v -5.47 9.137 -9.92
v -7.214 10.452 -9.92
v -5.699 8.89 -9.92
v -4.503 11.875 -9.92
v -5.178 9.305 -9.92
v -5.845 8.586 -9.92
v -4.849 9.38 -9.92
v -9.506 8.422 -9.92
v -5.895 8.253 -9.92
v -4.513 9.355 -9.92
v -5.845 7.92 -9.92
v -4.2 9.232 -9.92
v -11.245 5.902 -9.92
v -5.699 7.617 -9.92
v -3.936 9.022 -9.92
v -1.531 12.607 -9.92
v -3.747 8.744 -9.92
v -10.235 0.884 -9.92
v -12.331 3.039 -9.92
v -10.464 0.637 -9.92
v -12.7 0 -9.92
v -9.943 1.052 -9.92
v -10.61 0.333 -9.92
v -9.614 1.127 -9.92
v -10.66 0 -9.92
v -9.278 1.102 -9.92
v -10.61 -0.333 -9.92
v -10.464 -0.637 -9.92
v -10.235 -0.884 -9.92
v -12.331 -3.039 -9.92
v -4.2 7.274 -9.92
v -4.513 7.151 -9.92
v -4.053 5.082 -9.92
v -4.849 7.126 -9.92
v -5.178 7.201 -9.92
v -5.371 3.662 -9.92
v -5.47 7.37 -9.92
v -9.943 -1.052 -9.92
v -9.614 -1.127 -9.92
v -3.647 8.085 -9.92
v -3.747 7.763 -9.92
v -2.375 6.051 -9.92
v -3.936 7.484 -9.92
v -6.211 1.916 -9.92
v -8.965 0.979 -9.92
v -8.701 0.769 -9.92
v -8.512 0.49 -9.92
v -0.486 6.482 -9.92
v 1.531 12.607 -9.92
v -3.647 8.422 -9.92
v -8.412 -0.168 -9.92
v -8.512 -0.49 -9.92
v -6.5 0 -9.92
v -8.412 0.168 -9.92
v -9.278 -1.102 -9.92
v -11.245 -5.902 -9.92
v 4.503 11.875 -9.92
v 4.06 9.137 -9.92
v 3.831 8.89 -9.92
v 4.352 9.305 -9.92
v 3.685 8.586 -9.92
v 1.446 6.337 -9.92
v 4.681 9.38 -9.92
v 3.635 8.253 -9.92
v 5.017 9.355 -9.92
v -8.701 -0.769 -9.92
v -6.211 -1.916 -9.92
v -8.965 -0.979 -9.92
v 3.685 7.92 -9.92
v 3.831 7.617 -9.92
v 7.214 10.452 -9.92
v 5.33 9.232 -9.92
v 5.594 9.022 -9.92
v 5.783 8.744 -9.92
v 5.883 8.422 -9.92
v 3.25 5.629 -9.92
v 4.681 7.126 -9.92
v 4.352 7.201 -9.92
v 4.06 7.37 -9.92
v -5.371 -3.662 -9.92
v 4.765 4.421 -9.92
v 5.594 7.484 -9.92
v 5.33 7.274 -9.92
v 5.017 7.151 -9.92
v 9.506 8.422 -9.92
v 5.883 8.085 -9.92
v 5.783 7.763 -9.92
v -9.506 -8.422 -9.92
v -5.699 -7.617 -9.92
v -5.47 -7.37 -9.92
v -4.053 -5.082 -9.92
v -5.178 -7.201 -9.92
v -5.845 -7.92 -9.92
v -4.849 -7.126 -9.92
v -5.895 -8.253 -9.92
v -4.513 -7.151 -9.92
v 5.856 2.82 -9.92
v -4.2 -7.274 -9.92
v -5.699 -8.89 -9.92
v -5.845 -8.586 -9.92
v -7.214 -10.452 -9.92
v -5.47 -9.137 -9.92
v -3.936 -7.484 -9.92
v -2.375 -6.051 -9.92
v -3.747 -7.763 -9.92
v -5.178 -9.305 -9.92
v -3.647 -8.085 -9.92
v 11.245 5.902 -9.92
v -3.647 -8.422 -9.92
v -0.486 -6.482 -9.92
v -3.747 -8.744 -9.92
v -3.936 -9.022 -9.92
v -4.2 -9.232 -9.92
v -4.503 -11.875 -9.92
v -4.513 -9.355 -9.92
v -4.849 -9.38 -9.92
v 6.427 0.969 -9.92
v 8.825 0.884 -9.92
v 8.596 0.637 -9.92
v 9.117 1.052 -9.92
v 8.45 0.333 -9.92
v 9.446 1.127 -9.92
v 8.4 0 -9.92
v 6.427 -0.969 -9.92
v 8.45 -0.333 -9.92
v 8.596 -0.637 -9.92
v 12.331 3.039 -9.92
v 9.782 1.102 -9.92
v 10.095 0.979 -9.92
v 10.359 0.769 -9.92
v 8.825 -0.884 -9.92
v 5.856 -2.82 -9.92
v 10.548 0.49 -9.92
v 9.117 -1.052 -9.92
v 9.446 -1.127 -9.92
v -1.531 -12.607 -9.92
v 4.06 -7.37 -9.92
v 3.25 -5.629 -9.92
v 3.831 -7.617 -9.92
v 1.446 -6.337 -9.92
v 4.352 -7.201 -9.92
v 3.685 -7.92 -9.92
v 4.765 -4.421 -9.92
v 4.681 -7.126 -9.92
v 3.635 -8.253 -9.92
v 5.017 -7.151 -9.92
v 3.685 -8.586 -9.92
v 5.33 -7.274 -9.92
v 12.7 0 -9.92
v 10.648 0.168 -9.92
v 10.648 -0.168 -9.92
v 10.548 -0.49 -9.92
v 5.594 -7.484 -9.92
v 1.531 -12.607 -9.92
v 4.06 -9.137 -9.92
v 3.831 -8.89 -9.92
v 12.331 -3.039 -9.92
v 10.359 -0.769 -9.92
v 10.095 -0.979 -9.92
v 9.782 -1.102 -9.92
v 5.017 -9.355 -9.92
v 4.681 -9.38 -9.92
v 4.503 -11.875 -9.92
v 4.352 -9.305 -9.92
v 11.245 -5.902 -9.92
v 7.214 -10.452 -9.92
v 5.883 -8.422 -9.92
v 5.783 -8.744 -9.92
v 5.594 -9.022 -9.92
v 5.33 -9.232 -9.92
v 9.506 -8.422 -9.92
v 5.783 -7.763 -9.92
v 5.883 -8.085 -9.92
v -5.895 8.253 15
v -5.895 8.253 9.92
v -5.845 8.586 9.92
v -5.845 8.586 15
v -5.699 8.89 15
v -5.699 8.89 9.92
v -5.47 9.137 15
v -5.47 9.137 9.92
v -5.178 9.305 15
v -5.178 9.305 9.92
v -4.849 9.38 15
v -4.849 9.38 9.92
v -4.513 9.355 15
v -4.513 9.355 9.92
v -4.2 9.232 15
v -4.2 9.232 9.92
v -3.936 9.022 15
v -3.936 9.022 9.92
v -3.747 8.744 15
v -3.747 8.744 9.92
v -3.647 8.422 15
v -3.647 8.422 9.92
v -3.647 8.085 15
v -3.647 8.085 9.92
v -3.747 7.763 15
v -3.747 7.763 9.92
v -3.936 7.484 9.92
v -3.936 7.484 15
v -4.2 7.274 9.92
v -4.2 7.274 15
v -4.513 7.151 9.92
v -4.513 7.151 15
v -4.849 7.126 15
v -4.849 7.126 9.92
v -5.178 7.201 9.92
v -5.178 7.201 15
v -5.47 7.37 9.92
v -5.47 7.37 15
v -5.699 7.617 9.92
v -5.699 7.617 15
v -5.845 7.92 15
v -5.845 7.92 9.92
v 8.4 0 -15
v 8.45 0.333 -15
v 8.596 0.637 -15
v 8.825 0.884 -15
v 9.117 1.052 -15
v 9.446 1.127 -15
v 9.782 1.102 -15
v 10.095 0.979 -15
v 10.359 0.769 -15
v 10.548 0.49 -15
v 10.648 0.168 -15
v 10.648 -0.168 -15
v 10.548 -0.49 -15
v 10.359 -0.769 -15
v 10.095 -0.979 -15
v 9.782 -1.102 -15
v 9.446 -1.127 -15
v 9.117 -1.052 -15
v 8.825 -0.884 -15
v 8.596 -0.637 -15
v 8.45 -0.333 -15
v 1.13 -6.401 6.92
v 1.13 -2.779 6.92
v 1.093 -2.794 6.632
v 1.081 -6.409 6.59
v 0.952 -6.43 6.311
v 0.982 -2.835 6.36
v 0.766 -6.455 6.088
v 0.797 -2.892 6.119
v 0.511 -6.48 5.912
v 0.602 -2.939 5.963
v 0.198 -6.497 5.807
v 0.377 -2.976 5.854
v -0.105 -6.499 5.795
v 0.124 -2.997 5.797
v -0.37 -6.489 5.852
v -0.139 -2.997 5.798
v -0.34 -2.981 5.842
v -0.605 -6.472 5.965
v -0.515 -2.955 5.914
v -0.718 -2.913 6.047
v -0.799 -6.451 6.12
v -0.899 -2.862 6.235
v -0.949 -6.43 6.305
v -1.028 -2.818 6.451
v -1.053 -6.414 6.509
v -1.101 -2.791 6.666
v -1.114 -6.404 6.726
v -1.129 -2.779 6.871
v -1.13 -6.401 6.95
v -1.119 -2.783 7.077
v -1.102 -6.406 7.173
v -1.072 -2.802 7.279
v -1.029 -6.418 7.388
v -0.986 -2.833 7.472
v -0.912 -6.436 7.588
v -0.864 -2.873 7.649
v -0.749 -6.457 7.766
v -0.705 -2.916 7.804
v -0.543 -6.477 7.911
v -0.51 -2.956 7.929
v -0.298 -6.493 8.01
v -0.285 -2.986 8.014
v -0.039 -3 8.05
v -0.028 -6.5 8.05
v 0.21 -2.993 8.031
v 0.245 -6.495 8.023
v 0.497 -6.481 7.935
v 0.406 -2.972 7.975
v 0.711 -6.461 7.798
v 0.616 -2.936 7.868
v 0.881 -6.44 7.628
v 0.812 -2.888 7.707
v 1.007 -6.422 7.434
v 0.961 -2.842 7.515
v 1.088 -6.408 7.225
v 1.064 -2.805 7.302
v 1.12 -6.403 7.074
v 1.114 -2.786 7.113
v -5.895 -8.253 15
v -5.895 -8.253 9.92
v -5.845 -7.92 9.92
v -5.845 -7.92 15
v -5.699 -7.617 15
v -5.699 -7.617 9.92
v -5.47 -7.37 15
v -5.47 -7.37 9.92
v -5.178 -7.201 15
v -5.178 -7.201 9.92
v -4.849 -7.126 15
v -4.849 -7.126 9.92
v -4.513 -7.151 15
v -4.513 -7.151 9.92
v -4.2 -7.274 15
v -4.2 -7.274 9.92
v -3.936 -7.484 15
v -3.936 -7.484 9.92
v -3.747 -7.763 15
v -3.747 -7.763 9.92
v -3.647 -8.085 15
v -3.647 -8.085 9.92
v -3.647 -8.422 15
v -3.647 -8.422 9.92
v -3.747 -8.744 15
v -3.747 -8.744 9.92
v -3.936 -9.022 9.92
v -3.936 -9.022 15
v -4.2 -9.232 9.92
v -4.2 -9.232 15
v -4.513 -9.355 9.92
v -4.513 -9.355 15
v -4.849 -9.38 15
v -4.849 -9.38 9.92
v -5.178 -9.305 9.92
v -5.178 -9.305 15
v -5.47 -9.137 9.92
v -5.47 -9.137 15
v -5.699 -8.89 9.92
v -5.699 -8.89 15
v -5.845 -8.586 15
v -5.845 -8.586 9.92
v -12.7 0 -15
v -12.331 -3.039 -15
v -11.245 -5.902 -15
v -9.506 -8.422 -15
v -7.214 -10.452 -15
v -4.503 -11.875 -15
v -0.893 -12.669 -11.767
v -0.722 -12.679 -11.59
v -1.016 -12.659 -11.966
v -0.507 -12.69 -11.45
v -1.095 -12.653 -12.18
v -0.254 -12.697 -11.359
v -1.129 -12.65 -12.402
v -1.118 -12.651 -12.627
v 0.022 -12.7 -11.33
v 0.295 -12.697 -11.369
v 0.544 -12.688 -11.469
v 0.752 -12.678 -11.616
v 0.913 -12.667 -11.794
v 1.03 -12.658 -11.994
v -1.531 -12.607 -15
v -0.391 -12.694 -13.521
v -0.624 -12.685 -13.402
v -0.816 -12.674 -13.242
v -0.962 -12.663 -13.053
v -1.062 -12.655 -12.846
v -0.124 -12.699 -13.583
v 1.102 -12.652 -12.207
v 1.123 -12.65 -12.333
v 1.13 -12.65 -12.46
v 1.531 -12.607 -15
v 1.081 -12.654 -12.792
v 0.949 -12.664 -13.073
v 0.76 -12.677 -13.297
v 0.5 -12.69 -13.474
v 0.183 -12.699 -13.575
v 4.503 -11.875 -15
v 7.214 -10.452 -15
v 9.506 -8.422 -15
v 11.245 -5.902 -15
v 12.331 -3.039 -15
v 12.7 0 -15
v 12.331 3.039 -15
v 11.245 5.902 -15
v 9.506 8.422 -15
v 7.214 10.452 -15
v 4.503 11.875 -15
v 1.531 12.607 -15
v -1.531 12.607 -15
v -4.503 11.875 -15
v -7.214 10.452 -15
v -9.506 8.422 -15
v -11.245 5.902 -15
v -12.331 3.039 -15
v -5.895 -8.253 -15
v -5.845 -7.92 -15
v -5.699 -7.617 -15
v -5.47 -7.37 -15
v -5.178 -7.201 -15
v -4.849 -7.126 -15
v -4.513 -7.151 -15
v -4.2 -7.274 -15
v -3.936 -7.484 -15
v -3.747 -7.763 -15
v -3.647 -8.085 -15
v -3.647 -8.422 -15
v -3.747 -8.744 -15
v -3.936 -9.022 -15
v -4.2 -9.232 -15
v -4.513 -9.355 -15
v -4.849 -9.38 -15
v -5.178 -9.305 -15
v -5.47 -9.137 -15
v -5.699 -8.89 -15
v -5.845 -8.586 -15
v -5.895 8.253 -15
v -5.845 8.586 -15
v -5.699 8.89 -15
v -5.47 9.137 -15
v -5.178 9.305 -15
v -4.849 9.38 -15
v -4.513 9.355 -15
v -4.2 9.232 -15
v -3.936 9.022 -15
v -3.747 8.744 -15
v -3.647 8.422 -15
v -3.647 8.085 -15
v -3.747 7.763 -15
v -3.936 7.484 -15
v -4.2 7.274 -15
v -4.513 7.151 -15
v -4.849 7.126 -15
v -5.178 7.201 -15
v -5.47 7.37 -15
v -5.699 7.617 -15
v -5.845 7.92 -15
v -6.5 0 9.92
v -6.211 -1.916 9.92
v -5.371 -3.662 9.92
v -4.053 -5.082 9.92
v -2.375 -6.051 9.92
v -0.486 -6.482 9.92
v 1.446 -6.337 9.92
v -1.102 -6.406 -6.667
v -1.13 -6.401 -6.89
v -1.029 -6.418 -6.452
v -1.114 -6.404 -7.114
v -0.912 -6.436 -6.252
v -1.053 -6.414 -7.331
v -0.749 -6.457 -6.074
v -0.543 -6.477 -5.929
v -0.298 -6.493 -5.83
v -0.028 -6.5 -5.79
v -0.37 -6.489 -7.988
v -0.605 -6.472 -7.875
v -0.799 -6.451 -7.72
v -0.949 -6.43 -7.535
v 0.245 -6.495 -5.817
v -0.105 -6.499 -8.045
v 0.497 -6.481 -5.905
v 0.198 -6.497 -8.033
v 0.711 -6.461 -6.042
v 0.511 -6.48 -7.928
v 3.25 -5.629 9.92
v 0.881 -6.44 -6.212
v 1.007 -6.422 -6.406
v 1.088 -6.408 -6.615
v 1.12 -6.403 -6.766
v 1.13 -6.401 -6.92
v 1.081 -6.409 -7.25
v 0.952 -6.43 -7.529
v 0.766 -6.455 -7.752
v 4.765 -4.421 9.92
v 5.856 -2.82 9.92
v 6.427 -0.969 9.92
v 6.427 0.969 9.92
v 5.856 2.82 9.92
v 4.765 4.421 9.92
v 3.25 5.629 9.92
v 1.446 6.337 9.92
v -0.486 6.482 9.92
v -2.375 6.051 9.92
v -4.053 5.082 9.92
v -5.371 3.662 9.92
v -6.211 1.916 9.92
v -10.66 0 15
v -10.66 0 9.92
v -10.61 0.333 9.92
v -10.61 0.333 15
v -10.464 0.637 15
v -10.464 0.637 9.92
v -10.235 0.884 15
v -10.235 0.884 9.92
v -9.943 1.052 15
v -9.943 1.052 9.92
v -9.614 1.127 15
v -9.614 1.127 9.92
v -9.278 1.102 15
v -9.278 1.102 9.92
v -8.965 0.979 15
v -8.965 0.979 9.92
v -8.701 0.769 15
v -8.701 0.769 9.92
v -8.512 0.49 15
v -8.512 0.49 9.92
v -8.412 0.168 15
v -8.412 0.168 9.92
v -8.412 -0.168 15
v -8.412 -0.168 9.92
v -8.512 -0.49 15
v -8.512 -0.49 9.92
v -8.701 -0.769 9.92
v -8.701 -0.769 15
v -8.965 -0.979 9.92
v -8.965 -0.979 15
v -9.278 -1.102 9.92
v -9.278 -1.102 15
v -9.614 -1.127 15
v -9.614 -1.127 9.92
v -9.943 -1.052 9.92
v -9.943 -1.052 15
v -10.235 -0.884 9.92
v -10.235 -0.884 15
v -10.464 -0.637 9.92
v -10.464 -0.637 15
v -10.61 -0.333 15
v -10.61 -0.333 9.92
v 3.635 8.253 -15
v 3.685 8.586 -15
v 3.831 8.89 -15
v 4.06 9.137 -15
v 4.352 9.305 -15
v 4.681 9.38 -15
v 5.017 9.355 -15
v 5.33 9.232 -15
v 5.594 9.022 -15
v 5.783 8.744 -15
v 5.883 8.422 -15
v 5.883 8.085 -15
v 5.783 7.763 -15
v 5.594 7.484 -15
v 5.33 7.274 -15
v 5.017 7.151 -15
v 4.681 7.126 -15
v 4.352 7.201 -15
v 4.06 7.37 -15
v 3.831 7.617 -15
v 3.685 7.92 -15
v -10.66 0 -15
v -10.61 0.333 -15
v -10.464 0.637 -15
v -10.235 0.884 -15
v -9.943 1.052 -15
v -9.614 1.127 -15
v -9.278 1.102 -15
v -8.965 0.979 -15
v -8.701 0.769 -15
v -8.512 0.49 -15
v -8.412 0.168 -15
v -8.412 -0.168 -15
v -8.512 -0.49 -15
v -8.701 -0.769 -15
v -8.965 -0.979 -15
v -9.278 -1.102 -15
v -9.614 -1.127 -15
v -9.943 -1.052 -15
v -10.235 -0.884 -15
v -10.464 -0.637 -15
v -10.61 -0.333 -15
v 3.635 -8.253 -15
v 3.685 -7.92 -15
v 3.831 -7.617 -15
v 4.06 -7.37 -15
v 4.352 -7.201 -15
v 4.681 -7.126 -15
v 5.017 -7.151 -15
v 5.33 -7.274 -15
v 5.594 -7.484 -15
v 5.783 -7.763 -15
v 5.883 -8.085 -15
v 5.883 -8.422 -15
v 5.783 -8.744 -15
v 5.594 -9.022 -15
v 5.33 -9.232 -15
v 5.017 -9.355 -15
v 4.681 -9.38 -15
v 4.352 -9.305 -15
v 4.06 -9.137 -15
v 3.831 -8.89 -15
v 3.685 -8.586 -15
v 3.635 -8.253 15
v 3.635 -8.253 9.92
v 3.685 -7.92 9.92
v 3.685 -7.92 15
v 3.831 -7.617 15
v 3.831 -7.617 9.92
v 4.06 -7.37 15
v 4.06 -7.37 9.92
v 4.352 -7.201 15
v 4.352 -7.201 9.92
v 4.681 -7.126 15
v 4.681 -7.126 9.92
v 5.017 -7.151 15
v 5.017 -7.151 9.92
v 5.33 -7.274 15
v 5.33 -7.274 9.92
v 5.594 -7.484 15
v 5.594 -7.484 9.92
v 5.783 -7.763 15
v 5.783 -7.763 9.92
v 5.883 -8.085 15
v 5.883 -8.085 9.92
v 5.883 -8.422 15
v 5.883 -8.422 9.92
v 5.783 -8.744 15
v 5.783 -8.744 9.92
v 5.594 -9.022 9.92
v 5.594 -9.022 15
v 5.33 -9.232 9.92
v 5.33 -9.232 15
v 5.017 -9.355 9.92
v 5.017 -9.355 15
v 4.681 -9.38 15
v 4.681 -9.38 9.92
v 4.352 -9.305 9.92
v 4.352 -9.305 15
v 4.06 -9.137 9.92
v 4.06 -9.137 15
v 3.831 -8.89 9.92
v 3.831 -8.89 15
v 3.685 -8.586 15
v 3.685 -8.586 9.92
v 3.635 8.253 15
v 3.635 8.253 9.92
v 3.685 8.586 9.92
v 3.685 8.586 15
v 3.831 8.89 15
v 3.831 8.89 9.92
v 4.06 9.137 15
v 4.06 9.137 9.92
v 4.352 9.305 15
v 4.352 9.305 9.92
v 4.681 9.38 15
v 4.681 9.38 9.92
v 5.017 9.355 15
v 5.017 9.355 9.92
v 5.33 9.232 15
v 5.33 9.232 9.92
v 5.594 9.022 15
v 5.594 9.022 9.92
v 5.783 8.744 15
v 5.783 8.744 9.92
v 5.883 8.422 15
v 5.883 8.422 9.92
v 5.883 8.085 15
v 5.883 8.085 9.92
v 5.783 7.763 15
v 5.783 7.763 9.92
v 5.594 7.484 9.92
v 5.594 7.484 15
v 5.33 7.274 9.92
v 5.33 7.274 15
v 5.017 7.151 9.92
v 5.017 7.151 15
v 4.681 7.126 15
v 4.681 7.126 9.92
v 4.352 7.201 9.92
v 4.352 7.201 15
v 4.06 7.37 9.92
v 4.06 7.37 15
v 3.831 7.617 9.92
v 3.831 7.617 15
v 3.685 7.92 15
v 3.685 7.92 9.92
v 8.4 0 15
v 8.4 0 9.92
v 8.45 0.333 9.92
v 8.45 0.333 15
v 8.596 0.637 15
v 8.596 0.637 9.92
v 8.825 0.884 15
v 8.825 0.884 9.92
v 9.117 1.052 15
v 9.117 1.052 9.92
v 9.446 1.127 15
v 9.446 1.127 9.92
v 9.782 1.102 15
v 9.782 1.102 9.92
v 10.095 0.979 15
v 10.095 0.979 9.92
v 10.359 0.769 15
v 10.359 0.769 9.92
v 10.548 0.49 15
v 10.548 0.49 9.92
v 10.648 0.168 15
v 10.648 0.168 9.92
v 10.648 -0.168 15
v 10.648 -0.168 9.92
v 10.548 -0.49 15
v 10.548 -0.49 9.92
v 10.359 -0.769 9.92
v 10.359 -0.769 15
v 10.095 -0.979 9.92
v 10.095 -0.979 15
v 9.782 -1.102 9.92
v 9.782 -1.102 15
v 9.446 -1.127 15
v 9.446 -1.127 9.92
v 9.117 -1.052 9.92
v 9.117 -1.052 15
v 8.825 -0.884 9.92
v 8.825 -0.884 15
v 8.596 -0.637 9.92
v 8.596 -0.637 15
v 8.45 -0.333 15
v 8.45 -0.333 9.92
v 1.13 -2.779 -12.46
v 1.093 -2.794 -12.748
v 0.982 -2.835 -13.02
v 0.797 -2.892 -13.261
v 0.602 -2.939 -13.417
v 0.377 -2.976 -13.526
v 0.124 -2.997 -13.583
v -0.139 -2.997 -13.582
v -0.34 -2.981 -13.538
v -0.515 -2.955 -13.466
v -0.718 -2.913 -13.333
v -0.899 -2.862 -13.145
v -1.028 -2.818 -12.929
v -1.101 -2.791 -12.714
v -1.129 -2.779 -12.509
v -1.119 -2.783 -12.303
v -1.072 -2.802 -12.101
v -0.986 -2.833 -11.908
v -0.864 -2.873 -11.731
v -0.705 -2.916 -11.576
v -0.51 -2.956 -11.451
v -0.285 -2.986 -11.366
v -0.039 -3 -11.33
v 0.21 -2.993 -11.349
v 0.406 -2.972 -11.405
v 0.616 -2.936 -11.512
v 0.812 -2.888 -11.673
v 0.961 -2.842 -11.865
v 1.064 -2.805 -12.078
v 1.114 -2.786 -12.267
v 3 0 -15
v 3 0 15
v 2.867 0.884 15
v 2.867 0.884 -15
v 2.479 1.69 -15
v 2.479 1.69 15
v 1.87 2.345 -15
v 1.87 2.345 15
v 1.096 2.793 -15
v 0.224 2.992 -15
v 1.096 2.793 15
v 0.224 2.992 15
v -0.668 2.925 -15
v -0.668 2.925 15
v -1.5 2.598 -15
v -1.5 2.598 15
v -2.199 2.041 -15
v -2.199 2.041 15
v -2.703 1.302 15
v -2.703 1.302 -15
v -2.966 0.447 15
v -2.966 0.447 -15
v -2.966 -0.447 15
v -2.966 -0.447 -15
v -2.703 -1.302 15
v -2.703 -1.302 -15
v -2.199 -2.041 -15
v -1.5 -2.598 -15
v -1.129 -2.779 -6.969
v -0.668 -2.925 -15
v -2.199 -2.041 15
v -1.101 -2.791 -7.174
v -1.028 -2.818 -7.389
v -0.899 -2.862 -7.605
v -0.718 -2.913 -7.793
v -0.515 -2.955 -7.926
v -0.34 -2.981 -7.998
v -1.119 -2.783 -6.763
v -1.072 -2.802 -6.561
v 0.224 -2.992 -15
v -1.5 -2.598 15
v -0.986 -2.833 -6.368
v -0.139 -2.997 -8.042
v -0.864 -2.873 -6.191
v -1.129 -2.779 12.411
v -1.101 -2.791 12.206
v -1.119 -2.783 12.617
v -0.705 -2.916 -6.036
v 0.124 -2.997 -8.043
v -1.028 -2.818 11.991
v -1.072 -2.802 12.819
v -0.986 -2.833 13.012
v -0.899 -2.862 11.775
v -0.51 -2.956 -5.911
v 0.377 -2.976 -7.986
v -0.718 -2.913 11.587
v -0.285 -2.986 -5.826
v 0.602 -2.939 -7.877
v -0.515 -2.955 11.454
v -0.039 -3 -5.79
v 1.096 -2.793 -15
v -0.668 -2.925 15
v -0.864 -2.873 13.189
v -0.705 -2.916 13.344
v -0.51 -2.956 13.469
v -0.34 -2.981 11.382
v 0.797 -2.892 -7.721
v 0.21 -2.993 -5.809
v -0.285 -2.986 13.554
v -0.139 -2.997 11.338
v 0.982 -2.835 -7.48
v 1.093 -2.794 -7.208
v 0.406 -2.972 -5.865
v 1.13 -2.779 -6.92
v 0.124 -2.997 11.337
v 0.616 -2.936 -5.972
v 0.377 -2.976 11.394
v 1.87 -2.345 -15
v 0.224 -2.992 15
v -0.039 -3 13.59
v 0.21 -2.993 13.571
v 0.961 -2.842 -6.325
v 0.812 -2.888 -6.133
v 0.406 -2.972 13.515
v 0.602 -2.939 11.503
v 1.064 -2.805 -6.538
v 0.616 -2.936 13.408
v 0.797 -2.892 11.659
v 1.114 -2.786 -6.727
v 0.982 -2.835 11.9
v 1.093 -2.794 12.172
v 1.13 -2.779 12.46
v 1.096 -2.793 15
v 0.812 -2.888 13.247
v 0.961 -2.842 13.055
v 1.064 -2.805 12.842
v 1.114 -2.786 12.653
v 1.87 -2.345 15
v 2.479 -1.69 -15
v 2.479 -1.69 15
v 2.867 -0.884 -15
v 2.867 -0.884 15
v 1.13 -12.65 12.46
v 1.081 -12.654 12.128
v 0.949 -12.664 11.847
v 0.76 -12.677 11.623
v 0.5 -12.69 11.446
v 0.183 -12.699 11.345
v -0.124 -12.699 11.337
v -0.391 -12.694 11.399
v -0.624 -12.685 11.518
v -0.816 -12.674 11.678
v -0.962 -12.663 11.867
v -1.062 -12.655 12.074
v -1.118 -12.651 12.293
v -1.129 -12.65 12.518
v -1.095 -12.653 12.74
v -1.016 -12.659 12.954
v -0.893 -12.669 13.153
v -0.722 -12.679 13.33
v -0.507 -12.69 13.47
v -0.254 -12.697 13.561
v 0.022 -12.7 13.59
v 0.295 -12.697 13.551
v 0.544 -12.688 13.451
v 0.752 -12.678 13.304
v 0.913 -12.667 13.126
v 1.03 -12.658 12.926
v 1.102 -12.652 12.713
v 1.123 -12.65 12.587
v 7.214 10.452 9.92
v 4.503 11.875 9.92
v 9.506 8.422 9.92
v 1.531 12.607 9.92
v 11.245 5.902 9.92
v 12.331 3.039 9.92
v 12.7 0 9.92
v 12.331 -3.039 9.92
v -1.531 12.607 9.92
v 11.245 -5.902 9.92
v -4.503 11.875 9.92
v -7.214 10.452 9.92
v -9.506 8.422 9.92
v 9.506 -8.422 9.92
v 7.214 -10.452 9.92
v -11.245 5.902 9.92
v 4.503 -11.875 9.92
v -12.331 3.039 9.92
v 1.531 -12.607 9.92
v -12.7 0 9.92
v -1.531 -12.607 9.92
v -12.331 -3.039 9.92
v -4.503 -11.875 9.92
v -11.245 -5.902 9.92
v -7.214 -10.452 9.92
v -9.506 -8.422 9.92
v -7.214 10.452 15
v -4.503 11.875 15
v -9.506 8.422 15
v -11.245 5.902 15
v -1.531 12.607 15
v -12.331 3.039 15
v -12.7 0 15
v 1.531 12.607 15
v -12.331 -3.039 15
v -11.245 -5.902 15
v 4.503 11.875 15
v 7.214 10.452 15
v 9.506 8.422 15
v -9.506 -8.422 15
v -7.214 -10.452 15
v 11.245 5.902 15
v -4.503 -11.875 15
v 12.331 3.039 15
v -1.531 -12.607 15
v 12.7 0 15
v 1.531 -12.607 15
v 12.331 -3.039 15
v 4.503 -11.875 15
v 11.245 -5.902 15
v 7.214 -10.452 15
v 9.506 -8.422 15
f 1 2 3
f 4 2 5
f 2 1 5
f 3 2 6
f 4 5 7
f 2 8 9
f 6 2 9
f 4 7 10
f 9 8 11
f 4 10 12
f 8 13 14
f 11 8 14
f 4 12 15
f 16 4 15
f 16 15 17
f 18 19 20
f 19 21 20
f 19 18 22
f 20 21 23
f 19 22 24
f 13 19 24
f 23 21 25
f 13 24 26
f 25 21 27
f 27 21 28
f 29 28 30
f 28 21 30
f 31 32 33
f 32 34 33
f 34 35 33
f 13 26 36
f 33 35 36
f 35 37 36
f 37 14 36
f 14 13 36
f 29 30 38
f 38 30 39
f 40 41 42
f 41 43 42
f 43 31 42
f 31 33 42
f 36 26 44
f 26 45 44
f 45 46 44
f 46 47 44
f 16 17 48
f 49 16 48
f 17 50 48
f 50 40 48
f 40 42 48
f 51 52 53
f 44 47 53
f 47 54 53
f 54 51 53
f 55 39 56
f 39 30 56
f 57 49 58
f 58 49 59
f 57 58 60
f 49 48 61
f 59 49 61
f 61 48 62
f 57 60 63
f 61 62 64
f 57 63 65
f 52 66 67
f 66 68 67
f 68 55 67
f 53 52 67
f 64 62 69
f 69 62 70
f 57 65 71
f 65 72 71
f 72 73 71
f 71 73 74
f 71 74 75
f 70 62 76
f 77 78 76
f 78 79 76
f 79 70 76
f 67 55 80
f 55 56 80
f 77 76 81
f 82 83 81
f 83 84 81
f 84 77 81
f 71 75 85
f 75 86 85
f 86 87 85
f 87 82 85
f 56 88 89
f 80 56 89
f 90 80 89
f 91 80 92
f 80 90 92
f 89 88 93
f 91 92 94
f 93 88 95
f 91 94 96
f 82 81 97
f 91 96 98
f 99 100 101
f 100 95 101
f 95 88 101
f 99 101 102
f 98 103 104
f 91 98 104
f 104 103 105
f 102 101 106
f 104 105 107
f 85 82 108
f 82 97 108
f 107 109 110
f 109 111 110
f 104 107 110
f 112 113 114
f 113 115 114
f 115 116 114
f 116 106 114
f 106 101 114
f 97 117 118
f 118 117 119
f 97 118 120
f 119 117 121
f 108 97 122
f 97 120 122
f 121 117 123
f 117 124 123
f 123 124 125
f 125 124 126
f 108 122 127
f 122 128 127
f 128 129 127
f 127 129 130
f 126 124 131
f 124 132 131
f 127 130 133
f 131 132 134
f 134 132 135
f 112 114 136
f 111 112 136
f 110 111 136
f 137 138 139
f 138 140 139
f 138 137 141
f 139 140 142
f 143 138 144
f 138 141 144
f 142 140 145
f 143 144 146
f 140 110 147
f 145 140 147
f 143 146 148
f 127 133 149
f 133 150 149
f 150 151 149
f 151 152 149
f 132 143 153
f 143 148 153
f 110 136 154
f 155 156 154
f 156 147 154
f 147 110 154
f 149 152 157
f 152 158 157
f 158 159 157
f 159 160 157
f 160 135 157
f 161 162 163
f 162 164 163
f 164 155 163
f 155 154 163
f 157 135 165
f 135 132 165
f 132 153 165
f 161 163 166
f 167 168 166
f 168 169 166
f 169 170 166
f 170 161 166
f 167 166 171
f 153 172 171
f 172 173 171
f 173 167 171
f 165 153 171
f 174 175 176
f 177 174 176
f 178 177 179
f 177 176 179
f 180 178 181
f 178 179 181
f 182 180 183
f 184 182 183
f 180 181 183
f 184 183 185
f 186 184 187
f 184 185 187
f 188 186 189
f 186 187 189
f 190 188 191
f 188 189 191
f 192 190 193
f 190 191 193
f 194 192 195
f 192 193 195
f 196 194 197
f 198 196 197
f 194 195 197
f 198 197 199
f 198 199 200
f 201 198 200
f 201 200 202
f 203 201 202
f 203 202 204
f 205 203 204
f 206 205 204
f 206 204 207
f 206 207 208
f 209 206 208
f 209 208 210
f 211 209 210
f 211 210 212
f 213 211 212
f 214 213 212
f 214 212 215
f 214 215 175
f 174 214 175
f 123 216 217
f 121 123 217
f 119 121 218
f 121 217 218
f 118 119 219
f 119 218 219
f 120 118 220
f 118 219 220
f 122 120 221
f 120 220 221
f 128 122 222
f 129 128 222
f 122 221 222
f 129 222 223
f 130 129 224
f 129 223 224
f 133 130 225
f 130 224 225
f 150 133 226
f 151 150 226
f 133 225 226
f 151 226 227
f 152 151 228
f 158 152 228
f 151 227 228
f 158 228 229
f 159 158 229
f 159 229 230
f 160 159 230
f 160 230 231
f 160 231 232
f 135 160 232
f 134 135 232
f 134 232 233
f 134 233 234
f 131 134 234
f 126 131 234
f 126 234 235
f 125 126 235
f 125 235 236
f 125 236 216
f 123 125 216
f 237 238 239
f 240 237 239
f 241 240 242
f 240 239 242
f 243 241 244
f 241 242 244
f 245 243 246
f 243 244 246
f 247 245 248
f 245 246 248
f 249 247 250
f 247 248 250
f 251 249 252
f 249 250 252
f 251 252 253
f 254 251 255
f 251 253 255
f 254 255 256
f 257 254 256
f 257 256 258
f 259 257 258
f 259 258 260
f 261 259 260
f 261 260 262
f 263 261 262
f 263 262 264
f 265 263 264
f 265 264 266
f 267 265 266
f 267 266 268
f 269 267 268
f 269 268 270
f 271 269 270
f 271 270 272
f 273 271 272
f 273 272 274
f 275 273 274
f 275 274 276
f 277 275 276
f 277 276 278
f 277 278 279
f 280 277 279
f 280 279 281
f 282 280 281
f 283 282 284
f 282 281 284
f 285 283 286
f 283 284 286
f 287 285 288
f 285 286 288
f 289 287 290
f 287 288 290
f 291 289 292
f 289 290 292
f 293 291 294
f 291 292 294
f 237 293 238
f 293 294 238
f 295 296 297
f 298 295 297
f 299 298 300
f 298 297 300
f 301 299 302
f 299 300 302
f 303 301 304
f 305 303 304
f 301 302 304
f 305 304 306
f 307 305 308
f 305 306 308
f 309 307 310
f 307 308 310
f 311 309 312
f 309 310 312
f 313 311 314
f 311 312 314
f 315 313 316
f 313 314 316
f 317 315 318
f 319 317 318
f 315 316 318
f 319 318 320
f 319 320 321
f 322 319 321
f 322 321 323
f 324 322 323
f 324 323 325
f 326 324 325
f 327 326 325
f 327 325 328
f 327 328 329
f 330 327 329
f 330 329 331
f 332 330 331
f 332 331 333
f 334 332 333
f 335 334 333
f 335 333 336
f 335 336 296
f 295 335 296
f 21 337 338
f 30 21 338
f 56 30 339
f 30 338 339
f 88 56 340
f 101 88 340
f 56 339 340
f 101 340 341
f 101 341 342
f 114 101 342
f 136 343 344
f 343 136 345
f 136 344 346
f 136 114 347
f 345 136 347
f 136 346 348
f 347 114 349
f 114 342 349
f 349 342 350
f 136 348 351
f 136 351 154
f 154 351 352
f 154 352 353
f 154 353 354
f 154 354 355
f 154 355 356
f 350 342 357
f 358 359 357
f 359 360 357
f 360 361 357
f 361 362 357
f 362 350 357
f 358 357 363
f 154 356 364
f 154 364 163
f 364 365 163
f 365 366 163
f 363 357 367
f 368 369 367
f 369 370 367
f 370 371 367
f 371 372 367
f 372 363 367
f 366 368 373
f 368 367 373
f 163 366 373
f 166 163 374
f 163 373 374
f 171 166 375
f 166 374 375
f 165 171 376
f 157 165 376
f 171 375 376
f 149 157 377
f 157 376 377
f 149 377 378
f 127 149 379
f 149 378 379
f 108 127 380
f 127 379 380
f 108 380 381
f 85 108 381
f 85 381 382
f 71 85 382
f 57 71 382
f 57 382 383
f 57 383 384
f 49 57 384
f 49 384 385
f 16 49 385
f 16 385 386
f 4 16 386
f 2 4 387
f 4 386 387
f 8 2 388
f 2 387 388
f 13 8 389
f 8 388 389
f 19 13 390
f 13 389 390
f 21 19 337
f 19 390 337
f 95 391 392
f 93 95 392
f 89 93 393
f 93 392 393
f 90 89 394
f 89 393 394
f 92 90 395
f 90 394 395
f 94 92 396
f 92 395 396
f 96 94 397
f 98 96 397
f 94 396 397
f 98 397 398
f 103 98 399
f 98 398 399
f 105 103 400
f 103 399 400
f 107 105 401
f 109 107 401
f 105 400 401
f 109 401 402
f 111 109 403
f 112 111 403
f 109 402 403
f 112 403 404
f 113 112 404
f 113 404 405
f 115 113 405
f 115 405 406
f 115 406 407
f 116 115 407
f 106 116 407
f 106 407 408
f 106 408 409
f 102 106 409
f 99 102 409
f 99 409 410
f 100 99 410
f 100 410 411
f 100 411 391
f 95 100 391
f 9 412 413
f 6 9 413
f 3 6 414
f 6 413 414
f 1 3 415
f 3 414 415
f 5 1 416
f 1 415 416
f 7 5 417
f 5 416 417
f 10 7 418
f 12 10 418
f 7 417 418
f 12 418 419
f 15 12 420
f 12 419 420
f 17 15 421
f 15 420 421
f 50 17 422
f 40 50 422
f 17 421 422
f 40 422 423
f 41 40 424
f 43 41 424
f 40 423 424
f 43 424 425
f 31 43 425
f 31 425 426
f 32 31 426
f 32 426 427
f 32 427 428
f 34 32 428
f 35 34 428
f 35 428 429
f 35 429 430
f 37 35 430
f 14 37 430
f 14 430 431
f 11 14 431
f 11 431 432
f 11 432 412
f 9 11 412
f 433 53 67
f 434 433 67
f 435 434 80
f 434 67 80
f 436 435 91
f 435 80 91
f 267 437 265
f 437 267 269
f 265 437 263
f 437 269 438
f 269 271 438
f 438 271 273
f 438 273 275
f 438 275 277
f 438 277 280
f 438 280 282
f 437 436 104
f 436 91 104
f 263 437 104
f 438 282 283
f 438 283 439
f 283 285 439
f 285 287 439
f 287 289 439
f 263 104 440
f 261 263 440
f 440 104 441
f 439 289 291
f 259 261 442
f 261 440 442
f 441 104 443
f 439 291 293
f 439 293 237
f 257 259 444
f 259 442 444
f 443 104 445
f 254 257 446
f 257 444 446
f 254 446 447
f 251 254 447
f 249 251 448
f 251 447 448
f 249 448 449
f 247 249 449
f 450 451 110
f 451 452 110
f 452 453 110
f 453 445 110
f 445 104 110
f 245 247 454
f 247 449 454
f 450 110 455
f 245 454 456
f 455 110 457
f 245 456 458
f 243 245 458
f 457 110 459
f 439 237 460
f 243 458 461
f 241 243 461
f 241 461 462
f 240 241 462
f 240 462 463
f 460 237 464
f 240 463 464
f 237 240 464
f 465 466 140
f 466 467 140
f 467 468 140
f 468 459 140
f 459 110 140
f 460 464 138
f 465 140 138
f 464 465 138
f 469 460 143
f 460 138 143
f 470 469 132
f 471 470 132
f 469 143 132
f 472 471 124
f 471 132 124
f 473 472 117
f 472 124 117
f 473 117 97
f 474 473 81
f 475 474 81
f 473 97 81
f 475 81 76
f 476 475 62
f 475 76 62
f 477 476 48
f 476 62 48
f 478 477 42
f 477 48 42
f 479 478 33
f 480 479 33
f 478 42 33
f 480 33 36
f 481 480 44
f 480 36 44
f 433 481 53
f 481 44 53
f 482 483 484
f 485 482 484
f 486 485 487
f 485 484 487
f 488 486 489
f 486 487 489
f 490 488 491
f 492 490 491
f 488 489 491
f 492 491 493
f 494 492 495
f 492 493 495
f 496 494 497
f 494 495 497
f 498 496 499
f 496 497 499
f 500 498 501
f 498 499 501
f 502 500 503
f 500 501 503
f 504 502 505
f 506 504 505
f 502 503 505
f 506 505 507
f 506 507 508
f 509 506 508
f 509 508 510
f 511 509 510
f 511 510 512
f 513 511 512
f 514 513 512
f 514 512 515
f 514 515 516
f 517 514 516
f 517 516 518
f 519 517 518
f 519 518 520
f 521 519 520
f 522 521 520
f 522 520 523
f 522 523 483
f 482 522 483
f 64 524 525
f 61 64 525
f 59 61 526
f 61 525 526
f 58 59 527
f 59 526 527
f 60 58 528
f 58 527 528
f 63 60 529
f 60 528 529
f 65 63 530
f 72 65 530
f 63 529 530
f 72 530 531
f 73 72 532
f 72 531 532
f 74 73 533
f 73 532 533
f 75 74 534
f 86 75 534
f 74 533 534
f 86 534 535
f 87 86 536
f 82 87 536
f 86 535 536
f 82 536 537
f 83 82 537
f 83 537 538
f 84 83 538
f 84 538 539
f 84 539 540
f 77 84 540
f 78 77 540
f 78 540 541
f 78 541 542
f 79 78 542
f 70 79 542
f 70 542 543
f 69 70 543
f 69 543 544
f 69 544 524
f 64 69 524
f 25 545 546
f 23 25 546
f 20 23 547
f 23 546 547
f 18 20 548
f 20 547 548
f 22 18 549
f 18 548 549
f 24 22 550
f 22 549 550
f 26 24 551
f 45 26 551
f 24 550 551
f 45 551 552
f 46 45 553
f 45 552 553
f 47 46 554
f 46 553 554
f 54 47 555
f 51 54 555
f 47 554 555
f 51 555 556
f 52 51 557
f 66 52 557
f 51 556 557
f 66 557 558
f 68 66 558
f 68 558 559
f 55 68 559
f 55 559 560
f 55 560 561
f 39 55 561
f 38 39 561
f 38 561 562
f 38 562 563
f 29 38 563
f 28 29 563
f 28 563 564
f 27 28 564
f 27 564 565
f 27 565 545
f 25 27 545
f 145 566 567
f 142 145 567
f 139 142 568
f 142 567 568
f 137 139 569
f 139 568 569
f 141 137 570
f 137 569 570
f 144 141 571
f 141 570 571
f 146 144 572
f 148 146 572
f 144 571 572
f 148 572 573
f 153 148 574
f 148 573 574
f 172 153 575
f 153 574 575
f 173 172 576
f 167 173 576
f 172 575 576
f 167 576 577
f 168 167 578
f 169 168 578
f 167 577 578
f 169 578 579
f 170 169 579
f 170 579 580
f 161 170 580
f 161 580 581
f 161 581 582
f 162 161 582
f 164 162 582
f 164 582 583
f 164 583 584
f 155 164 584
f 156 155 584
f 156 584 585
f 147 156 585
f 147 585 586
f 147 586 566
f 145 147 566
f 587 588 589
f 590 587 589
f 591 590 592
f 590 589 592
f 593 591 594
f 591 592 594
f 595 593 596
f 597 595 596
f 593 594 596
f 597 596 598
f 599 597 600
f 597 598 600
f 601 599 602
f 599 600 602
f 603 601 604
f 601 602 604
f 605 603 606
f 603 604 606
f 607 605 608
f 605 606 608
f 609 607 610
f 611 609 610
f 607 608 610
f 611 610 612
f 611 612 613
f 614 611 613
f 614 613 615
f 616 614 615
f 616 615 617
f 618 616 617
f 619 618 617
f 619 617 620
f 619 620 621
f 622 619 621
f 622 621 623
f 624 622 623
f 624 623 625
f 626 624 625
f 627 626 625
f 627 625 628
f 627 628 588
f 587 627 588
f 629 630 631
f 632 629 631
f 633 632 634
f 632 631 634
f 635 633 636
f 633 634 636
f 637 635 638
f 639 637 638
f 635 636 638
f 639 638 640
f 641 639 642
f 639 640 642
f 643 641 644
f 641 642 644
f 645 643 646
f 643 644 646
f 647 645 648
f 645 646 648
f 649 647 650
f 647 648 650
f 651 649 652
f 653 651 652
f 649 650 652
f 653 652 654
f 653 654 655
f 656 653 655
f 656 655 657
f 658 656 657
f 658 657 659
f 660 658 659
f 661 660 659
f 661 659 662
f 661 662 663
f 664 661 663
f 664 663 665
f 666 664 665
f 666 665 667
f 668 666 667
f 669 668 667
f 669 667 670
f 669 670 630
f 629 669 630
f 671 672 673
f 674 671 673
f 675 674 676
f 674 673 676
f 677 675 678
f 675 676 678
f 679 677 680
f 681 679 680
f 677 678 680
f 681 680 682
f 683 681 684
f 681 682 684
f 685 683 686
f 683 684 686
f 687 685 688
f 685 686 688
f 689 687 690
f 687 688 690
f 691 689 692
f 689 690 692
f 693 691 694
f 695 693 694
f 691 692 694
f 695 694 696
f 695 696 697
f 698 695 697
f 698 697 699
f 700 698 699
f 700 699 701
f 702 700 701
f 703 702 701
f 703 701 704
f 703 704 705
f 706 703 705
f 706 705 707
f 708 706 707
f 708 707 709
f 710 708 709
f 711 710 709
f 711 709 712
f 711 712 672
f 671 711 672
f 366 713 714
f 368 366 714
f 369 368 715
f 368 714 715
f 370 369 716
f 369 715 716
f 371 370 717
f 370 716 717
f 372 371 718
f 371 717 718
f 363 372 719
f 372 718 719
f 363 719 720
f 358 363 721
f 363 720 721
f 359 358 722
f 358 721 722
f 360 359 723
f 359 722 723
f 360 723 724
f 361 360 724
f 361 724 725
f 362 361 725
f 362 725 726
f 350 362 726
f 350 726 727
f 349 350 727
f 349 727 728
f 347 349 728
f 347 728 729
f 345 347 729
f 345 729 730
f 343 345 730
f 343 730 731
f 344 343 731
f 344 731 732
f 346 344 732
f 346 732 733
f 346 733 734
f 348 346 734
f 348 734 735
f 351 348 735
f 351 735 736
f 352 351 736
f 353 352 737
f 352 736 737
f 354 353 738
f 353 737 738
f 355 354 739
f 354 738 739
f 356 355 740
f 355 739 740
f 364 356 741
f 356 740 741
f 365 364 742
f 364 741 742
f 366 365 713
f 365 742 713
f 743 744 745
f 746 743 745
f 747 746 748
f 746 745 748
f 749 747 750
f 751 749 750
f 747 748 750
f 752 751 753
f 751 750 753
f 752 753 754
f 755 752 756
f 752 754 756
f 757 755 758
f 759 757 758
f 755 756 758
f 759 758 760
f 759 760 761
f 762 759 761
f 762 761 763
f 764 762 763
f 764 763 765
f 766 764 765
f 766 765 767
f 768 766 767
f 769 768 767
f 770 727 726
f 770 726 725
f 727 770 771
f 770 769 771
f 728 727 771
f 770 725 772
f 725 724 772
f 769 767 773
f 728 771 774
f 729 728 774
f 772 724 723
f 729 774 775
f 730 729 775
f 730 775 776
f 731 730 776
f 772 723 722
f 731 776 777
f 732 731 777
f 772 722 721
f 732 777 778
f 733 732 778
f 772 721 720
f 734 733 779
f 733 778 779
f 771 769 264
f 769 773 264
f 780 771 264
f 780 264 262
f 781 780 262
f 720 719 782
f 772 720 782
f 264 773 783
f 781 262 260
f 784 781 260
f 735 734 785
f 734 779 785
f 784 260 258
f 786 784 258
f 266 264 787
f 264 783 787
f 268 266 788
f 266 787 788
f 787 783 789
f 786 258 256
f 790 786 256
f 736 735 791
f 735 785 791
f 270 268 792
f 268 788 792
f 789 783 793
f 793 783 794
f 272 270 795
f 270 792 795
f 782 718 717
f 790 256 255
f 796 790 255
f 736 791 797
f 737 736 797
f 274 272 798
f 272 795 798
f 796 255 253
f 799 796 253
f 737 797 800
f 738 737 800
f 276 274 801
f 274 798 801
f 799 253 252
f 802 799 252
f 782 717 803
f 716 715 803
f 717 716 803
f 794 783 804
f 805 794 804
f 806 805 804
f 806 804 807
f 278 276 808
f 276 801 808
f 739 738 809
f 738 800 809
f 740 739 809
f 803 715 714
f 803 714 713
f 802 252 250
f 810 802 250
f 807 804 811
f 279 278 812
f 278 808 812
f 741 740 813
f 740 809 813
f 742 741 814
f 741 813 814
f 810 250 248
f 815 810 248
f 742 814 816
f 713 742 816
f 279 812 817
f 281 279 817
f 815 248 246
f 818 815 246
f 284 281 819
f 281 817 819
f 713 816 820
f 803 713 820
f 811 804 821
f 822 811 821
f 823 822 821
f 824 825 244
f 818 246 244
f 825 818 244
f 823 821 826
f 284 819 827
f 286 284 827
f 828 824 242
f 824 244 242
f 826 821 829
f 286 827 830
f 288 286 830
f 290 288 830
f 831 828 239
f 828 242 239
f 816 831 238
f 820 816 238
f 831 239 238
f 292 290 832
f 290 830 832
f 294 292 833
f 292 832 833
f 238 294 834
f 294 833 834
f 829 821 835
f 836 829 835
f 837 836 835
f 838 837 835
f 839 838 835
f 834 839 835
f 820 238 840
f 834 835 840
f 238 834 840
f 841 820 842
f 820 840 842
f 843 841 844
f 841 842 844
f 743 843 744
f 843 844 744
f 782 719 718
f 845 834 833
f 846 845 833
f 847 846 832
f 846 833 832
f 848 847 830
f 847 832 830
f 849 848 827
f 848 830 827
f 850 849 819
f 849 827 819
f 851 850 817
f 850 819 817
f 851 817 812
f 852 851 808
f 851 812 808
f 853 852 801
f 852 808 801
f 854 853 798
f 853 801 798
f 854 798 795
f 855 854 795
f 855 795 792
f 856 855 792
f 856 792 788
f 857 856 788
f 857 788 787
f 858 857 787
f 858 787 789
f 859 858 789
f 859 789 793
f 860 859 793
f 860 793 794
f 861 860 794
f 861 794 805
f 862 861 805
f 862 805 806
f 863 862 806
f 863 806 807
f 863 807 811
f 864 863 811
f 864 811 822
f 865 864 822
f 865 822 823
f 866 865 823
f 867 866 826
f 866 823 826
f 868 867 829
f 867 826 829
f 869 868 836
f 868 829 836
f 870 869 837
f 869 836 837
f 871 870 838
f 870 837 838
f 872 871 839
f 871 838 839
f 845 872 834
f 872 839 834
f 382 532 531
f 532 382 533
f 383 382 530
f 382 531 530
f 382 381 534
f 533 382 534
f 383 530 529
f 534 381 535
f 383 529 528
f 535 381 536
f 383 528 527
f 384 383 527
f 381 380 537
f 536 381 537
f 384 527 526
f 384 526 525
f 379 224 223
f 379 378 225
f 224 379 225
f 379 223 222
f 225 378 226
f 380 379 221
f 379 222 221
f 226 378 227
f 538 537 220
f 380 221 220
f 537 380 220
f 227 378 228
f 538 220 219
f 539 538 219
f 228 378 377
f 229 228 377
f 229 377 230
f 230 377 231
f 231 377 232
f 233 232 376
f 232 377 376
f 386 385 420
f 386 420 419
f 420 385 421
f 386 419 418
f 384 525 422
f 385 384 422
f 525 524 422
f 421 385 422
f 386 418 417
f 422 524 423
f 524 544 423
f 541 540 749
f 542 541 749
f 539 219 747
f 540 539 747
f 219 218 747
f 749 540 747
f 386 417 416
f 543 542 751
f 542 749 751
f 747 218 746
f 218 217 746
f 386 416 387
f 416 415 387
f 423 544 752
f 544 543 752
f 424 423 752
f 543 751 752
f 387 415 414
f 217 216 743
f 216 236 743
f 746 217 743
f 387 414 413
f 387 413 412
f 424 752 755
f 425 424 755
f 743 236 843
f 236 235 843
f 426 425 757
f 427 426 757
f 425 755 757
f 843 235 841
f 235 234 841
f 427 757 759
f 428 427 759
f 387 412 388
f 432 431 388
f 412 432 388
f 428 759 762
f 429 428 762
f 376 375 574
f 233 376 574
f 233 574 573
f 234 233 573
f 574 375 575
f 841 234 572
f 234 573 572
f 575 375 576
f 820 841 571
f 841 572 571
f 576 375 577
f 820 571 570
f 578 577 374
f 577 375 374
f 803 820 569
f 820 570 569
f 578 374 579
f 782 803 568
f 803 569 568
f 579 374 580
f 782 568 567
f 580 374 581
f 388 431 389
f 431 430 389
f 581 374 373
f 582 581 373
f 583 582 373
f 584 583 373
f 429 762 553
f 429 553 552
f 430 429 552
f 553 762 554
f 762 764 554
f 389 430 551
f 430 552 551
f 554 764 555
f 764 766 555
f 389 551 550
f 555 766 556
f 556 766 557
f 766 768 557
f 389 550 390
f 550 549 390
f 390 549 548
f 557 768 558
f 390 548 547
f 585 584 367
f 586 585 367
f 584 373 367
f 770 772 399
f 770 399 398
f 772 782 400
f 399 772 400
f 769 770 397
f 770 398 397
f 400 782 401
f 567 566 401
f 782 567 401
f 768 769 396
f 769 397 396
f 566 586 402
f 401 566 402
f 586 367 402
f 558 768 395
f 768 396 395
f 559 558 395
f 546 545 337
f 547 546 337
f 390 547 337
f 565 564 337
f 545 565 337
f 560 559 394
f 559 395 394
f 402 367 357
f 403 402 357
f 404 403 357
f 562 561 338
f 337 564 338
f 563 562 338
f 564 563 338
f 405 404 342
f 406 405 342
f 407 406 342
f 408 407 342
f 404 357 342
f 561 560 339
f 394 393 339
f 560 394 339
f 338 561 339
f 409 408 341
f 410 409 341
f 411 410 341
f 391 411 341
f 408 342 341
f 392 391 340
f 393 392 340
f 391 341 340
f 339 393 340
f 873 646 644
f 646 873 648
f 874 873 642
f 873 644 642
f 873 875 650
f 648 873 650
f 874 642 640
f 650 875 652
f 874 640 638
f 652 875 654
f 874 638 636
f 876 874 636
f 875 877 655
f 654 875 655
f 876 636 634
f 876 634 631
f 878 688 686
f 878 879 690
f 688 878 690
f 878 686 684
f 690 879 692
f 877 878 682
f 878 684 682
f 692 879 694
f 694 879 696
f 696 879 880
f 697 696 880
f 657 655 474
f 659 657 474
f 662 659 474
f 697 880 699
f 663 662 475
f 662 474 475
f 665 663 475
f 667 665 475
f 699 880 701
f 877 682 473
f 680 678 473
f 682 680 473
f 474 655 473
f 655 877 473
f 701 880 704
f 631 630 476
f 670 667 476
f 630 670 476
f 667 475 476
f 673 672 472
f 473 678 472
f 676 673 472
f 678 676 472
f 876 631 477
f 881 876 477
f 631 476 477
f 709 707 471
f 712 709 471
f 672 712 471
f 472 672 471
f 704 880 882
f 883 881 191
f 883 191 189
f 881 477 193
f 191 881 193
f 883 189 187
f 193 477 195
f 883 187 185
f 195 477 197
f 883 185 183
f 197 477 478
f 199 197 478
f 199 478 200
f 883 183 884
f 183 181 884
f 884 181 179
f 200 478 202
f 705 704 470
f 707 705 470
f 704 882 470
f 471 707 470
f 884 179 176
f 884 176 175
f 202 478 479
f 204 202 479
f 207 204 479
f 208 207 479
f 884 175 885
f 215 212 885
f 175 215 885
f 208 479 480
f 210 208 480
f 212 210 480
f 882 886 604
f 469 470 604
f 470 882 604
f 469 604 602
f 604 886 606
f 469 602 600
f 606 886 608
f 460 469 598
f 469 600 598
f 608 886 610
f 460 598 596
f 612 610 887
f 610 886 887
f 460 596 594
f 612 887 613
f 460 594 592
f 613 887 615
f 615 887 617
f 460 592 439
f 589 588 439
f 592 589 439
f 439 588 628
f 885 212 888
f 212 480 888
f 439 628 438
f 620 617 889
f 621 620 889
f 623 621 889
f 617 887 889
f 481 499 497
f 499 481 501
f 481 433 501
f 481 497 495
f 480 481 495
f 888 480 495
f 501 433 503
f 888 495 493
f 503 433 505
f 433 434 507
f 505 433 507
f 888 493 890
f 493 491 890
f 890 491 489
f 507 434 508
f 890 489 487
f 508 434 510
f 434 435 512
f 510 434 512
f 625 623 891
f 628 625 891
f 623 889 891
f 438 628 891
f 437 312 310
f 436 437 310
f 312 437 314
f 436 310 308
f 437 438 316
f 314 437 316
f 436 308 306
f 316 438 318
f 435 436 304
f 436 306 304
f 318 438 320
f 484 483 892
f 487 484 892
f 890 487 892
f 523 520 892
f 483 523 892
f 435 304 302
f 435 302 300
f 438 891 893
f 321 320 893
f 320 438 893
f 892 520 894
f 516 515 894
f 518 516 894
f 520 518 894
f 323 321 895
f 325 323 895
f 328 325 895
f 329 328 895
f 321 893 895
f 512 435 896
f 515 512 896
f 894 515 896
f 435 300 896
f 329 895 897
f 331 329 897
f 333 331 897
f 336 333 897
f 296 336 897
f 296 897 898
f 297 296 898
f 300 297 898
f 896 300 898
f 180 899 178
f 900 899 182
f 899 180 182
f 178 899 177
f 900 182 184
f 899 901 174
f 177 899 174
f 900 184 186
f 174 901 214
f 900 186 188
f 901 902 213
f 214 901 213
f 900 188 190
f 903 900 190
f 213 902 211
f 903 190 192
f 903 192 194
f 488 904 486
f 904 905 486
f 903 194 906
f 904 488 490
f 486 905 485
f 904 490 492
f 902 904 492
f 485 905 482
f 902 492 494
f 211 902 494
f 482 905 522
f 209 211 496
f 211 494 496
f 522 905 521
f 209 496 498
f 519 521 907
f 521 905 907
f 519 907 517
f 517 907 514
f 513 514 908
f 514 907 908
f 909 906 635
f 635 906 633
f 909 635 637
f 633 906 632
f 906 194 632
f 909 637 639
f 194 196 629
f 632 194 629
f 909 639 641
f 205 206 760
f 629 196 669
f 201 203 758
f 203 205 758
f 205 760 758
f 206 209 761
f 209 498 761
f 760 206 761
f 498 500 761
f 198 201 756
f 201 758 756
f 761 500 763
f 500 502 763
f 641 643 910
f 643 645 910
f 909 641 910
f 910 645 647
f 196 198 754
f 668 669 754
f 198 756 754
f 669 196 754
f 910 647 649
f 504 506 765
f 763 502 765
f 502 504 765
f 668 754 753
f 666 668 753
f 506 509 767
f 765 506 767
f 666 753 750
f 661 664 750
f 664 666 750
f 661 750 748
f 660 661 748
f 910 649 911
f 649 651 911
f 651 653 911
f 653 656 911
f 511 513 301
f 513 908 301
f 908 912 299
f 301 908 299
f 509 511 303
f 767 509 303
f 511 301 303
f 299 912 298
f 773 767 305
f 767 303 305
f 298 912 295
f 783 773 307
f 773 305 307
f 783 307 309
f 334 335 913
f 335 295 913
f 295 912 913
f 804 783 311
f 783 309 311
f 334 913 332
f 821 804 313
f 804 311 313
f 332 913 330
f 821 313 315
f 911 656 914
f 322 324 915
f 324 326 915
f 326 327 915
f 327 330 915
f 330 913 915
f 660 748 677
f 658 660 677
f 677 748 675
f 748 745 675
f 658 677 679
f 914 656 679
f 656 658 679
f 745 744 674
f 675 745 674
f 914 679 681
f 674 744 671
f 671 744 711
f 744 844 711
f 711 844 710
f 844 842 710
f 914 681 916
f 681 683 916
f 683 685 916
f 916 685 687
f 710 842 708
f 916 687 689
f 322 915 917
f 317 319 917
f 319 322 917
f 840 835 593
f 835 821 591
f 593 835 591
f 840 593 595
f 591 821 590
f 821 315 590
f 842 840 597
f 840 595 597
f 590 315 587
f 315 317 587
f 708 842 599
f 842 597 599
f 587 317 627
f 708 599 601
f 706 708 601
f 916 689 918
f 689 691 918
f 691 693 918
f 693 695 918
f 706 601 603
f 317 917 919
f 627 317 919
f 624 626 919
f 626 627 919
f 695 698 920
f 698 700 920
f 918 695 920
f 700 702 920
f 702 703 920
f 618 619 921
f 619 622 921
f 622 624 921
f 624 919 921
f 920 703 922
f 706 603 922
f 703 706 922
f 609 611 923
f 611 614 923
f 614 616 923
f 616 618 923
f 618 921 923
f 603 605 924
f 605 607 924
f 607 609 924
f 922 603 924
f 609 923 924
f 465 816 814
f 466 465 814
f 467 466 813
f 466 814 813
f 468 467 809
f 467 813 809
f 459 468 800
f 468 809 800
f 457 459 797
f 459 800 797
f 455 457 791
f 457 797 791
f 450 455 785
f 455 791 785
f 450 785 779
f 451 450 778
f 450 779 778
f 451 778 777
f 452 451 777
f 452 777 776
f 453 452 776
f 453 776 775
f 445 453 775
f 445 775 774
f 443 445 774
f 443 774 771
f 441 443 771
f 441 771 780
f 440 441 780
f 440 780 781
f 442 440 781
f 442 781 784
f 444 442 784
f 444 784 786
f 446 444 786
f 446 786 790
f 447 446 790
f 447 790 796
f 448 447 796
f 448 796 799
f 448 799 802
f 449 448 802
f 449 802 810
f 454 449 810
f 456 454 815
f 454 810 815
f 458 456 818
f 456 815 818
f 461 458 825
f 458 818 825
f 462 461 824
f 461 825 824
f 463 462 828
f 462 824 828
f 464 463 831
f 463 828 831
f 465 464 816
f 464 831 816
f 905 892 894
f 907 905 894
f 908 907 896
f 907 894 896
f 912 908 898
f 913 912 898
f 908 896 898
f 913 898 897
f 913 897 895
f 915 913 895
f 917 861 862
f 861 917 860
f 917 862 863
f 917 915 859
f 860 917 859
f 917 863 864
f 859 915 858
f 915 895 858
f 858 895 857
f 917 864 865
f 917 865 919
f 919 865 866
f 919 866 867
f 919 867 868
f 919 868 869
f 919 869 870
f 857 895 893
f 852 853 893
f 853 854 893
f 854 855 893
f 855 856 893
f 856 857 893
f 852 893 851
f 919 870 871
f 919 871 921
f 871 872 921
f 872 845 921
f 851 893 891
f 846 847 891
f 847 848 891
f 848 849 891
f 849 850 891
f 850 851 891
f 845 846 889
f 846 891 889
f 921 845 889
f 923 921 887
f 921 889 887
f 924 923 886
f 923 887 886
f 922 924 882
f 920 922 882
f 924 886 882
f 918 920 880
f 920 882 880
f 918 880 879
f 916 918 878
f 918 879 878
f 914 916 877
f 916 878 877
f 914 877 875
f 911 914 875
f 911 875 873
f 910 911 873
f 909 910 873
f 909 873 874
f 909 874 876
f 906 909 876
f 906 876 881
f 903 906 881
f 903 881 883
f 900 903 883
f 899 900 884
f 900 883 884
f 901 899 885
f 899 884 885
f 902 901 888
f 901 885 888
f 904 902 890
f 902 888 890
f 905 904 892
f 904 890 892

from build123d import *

# Parameters (mm, degrees)
CROQUIS3_R                  = 3
CORTAR_EXTRUIR1_DEPTH       = 35.96541148
TALADRO_ROSCADO_4_403_D     = 2.2606
TALADRO_ROSCADO_4_403_DEPTH = 5.08
TALADRO_ROSCADO_4_405_D     = 2.2606
TALADRO_ROSCADO_4_405_DEPTH = 8.87
TALADRO_ROSCADO_4_405_TIP   = 0.679152758
TALADRO_ROSCADO_4_404_D     = 2.2606
TALADRO_ROSCADO_4_404_DEPTH = 12.699
TALADRO_ROSCADO_4_404_TIP   = 0.679152758


with BuildPart() as part:
    # Croquis2 → Revolución1 (revolve)
    with BuildSketch(Plane(origin=(0, 0, 0), x_dir=(0, 0, -1), z_dir=(1, 0, 0)), mode=Mode.PRIVATE) as revoluci_n1_sk:
        Polygon((-9.92, 6.5), (9.92, 6.5), (9.92, 12.7), (15, 12.7), (15, 0), (-15, 0), (-15, 12.7), (-9.92, 12.7), align=None)
    revolve(revoluci_n1_sk.sketch.rotate(Axis((0, 0, -15), (0, 0, 1)), 90), axis=Axis((0, 0, -15), (0, 0, 1)))

    # Croquis3 → Cortar-Extruir1 (cut, through all)
    with BuildSketch(Plane.XY.offset(15)):
        Circle(CROQUIS3_R)
    extrude(amount=-CORTAR_EXTRUIR1_DEPTH, mode=Mode.SUBTRACT)

    # Taladro roscado #4-403
    with Locations(Plane.XY.offset(-9.92)):
        with Locations((-9.53, 0), (-4.765, 8.253222098), (4.765, 8.253222098), (9.53, 0), (4.765, -8.253222098), (-4.765, -8.253222098), (0, 0)):
            Hole(TALADRO_ROSCADO_4_403_D / 2, depth=TALADRO_ROSCADO_4_403_DEPTH)

    # Taladro roscado #4-405
    with Locations(Plane.XY.offset(15)):
        with Locations((-9.53, 0), (-4.765, 8.253222098), (4.765, 8.253222098), (9.53, 0), (4.765, -8.253222098), (-4.765, -8.253222098)):
            Hole(TALADRO_ROSCADO_4_405_D / 2, depth=TALADRO_ROSCADO_4_405_DEPTH)
            with Locations((0, 0, -(TALADRO_ROSCADO_4_405_DEPTH + TALADRO_ROSCADO_4_405_TIP / 2))):  # 118° drill point
                Cone(0, TALADRO_ROSCADO_4_405_D / 2, TALADRO_ROSCADO_4_405_TIP, mode=Mode.SUBTRACT)

    # Taladro roscado #4-404
    with Locations(Plane(origin=(0, -12.7, 0), x_dir=(-1, 0, 0), z_dir=(0, -1, 0))):
        with Locations((0, 12.46), (0, 6.92), (0, -6.92), (0, -12.46)):
            Hole(TALADRO_ROSCADO_4_404_D / 2, depth=TALADRO_ROSCADO_4_404_DEPTH)
            with Locations((0, 0, -(TALADRO_ROSCADO_4_404_DEPTH + TALADRO_ROSCADO_4_404_TIP / 2))):  # 118° drill point
                Cone(0, TALADRO_ROSCADO_4_404_D / 2, TALADRO_ROSCADO_4_404_TIP, mode=Mode.SUBTRACT)


solid = part.part
